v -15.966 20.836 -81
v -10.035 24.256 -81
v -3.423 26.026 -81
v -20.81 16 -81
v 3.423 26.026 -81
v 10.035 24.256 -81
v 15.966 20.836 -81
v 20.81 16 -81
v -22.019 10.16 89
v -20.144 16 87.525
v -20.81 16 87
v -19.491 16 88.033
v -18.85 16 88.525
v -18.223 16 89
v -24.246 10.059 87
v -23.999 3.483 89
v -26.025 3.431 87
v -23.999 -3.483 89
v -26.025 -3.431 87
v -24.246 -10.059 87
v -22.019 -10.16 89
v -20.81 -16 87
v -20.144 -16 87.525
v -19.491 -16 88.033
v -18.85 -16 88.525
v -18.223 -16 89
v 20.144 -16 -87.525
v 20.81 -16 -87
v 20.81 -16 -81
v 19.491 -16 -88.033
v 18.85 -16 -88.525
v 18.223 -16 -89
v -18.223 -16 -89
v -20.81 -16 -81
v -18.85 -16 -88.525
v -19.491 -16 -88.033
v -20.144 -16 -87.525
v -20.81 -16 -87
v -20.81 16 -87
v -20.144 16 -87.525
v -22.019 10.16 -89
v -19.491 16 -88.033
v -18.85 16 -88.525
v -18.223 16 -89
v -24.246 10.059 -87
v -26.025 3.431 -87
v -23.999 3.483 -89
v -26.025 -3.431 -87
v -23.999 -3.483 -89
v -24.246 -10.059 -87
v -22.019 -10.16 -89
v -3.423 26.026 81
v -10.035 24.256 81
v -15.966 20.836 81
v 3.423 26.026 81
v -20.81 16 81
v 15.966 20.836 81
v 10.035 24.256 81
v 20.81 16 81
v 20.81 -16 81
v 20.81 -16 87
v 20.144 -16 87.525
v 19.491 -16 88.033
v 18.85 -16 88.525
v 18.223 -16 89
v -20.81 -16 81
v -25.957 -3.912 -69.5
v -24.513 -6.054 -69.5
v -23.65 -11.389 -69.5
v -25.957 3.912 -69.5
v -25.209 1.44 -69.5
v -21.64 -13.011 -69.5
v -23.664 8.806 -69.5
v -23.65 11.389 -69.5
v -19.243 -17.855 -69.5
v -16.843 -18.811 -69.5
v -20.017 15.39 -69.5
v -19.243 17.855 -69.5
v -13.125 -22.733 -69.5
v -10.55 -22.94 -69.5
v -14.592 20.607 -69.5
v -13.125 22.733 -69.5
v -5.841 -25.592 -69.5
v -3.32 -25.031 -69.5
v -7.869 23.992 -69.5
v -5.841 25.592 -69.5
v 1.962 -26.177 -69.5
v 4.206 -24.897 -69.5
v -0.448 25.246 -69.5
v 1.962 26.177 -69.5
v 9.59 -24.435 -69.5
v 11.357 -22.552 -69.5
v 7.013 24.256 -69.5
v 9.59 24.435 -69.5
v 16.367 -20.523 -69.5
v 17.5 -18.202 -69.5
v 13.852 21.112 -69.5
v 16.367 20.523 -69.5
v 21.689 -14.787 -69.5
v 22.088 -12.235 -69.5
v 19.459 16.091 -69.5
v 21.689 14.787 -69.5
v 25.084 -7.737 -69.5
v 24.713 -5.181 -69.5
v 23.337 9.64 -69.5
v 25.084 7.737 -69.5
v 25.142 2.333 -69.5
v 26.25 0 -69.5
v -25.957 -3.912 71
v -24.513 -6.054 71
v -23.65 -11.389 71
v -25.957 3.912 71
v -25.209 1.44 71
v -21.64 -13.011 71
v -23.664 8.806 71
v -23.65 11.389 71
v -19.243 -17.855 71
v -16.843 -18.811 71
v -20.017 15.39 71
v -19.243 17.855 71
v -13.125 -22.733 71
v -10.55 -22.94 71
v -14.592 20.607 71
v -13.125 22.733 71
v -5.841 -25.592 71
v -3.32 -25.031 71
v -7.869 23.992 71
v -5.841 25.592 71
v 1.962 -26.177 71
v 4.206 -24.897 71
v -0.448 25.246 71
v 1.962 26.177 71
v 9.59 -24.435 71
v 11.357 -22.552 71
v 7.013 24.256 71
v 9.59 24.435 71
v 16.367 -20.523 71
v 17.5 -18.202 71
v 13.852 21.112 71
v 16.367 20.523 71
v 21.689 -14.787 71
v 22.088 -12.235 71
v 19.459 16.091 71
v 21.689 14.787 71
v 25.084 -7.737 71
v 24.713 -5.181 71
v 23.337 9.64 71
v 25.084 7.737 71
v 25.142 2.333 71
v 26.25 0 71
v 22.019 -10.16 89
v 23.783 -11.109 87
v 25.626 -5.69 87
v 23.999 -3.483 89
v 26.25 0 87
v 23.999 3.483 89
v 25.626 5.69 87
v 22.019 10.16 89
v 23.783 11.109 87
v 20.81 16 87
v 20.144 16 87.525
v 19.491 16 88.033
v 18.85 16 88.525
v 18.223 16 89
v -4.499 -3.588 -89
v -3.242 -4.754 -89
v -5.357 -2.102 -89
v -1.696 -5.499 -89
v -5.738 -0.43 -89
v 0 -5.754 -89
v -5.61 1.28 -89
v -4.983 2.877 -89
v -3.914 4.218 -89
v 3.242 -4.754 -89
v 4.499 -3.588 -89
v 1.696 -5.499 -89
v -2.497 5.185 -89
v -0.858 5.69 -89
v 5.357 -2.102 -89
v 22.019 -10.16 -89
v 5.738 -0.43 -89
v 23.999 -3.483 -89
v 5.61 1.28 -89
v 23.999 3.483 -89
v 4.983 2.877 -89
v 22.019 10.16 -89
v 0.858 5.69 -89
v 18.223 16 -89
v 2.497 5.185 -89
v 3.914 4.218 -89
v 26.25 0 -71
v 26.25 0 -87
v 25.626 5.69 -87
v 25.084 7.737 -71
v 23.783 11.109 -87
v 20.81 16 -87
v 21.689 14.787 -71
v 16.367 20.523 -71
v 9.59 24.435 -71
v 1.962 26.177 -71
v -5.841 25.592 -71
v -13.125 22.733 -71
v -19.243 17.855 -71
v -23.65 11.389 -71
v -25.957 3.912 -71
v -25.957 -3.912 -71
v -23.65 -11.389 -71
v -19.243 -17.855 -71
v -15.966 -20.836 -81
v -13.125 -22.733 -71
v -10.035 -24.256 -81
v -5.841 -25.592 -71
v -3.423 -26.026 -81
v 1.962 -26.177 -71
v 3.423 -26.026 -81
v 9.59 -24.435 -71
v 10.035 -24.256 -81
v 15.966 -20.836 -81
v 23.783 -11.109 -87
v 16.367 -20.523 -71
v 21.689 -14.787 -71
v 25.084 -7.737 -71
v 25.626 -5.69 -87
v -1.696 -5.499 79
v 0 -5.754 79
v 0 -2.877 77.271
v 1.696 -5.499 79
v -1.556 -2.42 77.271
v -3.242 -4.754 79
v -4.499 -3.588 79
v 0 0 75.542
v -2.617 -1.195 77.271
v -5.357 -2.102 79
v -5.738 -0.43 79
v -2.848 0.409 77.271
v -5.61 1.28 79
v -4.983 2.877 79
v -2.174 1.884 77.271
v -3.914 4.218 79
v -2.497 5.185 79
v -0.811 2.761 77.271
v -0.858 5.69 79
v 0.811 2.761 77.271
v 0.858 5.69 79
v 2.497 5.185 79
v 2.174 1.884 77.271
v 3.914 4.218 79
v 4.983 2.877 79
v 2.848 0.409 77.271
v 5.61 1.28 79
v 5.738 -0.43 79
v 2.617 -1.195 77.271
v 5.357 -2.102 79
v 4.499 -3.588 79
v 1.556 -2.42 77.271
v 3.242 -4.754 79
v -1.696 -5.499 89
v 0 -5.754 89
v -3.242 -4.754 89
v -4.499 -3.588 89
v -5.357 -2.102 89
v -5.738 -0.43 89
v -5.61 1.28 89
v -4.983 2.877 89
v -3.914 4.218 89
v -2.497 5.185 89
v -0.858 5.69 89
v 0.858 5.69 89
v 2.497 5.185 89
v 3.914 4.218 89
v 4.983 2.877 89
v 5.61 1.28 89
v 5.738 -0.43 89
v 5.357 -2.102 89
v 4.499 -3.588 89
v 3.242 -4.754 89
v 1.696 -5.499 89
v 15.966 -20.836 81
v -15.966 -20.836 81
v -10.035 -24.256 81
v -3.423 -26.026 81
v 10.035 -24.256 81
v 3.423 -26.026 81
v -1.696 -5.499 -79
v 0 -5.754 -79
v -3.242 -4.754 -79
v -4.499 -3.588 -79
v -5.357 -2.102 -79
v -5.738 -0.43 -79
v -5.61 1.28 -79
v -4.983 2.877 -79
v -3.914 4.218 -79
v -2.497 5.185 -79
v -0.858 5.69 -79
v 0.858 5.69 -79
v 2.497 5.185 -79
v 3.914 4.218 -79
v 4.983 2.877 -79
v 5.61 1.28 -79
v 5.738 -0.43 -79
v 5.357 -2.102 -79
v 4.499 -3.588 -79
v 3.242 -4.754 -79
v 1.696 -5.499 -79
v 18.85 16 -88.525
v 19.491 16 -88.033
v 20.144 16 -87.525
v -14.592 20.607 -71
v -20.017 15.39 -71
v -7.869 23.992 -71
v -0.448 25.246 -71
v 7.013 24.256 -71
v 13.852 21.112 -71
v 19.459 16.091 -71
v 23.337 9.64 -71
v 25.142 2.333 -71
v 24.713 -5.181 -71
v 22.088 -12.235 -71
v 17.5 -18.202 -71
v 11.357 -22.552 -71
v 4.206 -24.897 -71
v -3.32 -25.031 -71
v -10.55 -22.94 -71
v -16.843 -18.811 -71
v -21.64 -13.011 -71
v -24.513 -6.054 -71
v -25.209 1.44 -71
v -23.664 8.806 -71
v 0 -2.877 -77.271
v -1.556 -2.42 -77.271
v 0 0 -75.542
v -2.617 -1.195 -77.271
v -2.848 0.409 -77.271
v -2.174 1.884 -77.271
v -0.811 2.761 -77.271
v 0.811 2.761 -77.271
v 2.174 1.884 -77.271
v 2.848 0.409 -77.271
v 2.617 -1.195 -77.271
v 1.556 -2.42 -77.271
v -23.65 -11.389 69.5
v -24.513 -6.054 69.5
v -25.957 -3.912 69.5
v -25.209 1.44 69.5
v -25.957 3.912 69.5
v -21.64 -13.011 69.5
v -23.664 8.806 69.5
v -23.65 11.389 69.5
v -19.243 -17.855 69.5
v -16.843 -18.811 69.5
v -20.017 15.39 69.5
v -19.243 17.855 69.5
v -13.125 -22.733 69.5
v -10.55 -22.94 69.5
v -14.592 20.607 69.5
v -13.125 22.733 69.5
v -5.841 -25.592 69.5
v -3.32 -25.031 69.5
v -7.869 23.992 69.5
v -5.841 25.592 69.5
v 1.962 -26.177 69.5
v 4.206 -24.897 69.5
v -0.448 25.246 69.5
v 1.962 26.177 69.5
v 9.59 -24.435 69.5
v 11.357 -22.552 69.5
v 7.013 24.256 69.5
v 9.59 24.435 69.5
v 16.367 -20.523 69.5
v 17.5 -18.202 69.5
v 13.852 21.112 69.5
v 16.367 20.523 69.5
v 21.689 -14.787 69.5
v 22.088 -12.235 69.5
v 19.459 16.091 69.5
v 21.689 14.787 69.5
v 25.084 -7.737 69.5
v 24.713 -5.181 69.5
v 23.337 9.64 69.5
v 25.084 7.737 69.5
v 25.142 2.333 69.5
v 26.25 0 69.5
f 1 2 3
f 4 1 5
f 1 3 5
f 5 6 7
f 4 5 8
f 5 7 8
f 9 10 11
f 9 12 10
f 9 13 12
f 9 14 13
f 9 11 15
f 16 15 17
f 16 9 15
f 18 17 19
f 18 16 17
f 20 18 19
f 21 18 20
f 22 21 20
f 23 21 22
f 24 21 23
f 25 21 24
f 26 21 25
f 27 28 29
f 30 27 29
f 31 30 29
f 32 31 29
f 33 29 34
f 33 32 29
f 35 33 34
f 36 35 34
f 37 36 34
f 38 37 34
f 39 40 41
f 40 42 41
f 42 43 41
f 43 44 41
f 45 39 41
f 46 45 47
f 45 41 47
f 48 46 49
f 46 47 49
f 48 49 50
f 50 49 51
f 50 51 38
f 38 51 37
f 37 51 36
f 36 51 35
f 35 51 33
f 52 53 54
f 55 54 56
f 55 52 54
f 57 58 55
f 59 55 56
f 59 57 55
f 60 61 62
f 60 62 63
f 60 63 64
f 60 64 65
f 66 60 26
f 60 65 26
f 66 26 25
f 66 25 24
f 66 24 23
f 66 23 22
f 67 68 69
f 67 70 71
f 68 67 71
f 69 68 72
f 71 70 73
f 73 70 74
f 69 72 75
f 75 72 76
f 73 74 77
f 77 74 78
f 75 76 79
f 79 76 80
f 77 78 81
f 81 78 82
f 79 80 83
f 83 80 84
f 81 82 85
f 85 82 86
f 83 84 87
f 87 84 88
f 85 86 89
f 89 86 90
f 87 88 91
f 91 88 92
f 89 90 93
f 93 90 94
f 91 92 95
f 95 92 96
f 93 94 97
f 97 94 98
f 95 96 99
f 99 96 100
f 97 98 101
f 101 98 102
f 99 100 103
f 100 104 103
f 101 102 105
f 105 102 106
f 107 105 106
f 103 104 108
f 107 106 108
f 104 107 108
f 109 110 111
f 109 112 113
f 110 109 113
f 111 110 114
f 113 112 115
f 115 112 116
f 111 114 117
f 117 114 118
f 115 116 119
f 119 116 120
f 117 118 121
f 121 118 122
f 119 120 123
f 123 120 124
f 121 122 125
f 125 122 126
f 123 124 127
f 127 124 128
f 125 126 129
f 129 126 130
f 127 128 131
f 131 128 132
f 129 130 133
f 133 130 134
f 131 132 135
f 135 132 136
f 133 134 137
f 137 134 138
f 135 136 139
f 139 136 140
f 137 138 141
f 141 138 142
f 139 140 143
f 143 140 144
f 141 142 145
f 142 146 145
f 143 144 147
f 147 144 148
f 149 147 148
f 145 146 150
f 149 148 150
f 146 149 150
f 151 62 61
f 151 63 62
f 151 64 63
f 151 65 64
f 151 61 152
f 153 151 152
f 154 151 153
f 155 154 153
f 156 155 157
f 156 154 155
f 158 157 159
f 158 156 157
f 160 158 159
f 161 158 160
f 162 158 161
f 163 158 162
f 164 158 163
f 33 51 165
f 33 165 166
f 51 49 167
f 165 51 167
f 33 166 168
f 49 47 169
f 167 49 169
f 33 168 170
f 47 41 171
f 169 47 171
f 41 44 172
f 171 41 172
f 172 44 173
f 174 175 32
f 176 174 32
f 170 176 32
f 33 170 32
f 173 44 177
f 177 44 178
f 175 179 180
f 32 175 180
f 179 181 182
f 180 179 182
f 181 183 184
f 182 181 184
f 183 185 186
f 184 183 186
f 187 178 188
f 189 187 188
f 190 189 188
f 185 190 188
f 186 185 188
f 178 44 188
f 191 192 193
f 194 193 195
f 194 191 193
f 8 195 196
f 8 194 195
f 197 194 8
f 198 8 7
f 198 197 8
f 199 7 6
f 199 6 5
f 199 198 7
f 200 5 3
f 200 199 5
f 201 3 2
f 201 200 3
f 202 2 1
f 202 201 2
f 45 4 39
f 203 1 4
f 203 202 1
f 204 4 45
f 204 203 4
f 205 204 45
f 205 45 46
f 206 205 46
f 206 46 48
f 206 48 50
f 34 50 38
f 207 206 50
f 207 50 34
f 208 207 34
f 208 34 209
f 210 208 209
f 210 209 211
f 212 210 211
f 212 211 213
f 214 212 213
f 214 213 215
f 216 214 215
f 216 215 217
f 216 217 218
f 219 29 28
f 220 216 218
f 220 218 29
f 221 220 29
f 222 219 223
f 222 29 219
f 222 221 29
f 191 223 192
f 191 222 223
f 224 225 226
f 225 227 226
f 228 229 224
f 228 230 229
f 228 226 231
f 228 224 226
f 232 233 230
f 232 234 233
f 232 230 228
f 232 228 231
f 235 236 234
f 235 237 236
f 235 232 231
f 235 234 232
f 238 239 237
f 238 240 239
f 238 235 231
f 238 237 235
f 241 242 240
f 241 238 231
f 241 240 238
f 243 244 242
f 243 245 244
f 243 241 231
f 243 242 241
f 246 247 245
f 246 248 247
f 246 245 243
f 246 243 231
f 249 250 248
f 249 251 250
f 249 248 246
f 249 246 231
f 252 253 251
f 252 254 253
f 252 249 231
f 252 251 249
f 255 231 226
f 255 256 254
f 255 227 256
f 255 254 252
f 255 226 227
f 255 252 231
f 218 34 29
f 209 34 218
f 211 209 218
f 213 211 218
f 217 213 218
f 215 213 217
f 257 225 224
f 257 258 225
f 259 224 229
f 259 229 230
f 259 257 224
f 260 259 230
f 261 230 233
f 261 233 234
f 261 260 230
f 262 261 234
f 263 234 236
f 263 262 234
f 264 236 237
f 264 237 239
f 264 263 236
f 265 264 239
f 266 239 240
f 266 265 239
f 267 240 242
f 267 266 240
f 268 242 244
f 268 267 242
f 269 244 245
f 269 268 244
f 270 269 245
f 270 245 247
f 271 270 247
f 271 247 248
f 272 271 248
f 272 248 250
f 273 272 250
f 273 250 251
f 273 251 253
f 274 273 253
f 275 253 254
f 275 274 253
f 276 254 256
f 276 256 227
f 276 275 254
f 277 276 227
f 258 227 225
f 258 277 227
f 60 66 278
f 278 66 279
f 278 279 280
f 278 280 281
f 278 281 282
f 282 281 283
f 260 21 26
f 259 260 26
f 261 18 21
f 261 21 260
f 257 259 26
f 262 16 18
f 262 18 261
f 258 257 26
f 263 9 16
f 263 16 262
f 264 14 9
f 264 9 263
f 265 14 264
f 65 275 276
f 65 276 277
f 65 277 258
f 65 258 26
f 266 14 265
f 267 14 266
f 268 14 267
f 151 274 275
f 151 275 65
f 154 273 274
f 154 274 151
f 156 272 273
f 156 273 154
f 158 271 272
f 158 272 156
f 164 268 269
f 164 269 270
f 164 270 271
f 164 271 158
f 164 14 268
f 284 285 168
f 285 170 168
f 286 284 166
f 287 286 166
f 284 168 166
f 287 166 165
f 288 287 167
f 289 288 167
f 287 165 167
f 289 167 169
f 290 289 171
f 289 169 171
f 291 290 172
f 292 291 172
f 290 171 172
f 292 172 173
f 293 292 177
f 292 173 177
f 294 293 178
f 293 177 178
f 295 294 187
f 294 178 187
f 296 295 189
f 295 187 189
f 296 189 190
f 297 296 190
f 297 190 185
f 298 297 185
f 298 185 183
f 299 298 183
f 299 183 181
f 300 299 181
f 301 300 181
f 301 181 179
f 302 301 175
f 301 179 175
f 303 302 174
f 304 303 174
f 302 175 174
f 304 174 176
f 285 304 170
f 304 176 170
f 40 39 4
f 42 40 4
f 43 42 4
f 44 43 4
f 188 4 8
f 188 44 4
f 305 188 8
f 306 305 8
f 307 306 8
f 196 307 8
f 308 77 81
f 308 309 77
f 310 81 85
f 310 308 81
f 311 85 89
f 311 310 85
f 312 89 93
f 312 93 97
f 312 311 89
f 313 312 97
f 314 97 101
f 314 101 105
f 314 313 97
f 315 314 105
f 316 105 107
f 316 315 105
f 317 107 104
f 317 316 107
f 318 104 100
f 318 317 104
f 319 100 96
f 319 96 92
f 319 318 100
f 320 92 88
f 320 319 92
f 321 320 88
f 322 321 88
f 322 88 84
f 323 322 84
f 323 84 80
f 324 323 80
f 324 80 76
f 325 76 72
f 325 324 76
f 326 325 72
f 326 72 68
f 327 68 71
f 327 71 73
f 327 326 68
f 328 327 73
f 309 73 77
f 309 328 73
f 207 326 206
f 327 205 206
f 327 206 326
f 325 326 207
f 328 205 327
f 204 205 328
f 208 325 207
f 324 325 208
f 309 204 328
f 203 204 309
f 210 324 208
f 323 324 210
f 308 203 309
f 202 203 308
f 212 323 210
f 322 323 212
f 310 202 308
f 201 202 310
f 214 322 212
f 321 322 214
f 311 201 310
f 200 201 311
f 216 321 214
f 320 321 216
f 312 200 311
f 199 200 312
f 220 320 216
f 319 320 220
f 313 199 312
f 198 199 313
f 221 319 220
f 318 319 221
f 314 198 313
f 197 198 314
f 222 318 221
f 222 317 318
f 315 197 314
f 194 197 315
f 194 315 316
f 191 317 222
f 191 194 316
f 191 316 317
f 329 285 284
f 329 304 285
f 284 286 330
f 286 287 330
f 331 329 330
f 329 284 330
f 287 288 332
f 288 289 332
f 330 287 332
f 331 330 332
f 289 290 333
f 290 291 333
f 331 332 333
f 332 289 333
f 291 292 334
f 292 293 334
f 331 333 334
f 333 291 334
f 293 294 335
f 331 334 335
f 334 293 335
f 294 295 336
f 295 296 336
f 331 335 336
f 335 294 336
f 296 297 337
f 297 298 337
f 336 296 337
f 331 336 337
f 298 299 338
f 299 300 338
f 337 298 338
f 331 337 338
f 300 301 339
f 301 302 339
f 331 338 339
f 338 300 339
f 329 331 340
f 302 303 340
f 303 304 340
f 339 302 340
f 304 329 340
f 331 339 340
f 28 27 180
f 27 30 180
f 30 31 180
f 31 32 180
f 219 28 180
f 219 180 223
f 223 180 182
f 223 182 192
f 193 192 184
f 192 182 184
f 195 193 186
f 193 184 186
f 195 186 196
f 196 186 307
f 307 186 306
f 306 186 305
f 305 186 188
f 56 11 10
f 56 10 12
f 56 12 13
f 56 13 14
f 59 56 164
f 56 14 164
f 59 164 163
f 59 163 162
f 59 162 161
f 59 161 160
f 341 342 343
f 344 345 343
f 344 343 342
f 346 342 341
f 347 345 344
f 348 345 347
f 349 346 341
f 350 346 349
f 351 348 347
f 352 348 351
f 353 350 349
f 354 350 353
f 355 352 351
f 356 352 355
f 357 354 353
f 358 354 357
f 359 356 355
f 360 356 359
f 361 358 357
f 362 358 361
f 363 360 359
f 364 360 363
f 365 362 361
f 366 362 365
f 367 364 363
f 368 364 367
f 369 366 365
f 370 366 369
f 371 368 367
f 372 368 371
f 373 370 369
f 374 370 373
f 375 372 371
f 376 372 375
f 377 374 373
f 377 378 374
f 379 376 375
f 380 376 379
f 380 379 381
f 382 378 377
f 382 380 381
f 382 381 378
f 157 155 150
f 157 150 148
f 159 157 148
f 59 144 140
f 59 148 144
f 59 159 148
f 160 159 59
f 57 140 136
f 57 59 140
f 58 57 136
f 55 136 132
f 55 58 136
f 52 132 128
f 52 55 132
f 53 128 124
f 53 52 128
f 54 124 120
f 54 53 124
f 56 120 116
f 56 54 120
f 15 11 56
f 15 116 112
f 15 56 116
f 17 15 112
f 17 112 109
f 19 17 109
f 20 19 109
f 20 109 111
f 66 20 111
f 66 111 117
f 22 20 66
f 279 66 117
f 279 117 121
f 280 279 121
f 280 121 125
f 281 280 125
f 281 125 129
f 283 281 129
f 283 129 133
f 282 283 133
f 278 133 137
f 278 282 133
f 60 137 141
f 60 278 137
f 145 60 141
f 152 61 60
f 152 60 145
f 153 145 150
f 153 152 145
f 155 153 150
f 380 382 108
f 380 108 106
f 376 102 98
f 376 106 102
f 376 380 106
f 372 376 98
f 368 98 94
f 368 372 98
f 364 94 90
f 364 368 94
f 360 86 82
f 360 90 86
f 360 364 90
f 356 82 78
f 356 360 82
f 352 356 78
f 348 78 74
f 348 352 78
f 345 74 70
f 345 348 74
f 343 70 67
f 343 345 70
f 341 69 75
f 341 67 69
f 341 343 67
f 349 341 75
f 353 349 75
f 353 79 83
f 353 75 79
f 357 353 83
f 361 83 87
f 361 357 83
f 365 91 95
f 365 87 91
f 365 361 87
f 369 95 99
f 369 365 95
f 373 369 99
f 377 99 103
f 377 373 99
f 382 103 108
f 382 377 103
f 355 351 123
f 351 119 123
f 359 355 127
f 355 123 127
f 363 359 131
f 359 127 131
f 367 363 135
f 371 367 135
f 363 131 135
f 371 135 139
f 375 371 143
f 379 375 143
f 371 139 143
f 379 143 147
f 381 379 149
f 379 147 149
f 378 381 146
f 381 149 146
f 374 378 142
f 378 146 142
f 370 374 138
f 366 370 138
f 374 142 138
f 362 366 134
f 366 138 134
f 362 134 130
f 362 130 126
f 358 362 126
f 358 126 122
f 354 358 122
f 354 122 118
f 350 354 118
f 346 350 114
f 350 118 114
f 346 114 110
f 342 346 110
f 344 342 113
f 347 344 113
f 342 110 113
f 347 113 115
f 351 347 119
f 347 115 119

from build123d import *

# Parameters (mm, degrees)
SKETCH1_R           = 26.25
BOSS_EXTRUDE1_DEPTH = 89
CUT_EXTRUDE1_DEPTH  = 8
SKETCH29_W          = 1
SKETCH29_H          = 1.5
CHAMFER1_SIZE       = 2


with BuildPart() as part:
    # Sketch1 → Boss-Extrude1 (new, symmetric)
    with BuildSketch(Plane.XY):
        Circle(SKETCH1_R)
    extrude(amount=BOSS_EXTRUDE1_DEPTH, both=True)

    # Sketch2 → Cut-Extrude1 (cut)
    with BuildSketch(Plane.XY.offset(89)):
        with BuildLine():
            Line((-20.810153772, 16), (20.810153772, 16))
            ThreePointArc((20.810153772, 16), (0, 26.25), (-20.810153772, 16))
        make_face()
        with BuildLine():
            Line((20.810153772, -16), (-20.810153772, -16))
            ThreePointArc((-20.810153772, -16), (0, -26.25), (20.810153772, -16))
        make_face()
    cut_extrude1 = extrude(amount=-CUT_EXTRUDE1_DEPTH, mode=Mode.SUBTRACT)

    # Sketch27 → 1/2-20 Tapped Hole3 (revolve, cut)
    with BuildSketch(Plane(origin=(0, 0, 89), x_dir=(0, -1, 0), z_dir=(1, 0, 0))):
        Polygon((0, 0), (0, 13.45757432), (5.75437, 10), (5.75437, 0), align=None)
    f_1_2_20_tapped_hole3 = revolve(axis=Axis((0, 0, 95.35), (0, 0, -1)), mode=Mode.SUBTRACT)

    # Mirror2: Cut-Extrude1, 1/2-20 Tapped Hole3 across plane
    add(cut_extrude1.mirror(Plane.XY), mode=Mode.SUBTRACT)
    add(f_1_2_20_tapped_hole3.mirror(Plane.XY), mode=Mode.SUBTRACT)

    # Sketch29 → Cut-Revolve1 (revolve, cut)
    with BuildSketch(Plane(origin=(0, 0, 0), x_dir=(1, 0, 0), z_dir=(0, 1, 0)), mode=Mode.PRIVATE) as cut_revolve1_sk:
        with Locations((25.75, 70.25)):
            Rectangle(SKETCH29_W, SKETCH29_H)
    cut_revolve1 = revolve(cut_revolve1_sk.sketch.rotate(Axis((0, 0, 89), (0, 0, -1)), 217.555079253), axis=Axis((0, 0, 89), (0, 0, -1)), mode=Mode.SUBTRACT)

    # Mirror3: Cut-Revolve1 across plane
    add(cut_revolve1.mirror(Plane.XY), mode=Mode.SUBTRACT)

    # Chamfer1
    chamfer1_edges = [part.edges().sort_by_distance(p)[0] for p in [
        (-26.25, 0, -89),
        (24.852857346, -8.449732644, -89),
        (-26.25, 0, 89),
        (24.852857346, 8.449732644, 89),
    ]]
    chamfer(chamfer1_edges, length=CHAMFER1_SIZE)


solid = part.part
